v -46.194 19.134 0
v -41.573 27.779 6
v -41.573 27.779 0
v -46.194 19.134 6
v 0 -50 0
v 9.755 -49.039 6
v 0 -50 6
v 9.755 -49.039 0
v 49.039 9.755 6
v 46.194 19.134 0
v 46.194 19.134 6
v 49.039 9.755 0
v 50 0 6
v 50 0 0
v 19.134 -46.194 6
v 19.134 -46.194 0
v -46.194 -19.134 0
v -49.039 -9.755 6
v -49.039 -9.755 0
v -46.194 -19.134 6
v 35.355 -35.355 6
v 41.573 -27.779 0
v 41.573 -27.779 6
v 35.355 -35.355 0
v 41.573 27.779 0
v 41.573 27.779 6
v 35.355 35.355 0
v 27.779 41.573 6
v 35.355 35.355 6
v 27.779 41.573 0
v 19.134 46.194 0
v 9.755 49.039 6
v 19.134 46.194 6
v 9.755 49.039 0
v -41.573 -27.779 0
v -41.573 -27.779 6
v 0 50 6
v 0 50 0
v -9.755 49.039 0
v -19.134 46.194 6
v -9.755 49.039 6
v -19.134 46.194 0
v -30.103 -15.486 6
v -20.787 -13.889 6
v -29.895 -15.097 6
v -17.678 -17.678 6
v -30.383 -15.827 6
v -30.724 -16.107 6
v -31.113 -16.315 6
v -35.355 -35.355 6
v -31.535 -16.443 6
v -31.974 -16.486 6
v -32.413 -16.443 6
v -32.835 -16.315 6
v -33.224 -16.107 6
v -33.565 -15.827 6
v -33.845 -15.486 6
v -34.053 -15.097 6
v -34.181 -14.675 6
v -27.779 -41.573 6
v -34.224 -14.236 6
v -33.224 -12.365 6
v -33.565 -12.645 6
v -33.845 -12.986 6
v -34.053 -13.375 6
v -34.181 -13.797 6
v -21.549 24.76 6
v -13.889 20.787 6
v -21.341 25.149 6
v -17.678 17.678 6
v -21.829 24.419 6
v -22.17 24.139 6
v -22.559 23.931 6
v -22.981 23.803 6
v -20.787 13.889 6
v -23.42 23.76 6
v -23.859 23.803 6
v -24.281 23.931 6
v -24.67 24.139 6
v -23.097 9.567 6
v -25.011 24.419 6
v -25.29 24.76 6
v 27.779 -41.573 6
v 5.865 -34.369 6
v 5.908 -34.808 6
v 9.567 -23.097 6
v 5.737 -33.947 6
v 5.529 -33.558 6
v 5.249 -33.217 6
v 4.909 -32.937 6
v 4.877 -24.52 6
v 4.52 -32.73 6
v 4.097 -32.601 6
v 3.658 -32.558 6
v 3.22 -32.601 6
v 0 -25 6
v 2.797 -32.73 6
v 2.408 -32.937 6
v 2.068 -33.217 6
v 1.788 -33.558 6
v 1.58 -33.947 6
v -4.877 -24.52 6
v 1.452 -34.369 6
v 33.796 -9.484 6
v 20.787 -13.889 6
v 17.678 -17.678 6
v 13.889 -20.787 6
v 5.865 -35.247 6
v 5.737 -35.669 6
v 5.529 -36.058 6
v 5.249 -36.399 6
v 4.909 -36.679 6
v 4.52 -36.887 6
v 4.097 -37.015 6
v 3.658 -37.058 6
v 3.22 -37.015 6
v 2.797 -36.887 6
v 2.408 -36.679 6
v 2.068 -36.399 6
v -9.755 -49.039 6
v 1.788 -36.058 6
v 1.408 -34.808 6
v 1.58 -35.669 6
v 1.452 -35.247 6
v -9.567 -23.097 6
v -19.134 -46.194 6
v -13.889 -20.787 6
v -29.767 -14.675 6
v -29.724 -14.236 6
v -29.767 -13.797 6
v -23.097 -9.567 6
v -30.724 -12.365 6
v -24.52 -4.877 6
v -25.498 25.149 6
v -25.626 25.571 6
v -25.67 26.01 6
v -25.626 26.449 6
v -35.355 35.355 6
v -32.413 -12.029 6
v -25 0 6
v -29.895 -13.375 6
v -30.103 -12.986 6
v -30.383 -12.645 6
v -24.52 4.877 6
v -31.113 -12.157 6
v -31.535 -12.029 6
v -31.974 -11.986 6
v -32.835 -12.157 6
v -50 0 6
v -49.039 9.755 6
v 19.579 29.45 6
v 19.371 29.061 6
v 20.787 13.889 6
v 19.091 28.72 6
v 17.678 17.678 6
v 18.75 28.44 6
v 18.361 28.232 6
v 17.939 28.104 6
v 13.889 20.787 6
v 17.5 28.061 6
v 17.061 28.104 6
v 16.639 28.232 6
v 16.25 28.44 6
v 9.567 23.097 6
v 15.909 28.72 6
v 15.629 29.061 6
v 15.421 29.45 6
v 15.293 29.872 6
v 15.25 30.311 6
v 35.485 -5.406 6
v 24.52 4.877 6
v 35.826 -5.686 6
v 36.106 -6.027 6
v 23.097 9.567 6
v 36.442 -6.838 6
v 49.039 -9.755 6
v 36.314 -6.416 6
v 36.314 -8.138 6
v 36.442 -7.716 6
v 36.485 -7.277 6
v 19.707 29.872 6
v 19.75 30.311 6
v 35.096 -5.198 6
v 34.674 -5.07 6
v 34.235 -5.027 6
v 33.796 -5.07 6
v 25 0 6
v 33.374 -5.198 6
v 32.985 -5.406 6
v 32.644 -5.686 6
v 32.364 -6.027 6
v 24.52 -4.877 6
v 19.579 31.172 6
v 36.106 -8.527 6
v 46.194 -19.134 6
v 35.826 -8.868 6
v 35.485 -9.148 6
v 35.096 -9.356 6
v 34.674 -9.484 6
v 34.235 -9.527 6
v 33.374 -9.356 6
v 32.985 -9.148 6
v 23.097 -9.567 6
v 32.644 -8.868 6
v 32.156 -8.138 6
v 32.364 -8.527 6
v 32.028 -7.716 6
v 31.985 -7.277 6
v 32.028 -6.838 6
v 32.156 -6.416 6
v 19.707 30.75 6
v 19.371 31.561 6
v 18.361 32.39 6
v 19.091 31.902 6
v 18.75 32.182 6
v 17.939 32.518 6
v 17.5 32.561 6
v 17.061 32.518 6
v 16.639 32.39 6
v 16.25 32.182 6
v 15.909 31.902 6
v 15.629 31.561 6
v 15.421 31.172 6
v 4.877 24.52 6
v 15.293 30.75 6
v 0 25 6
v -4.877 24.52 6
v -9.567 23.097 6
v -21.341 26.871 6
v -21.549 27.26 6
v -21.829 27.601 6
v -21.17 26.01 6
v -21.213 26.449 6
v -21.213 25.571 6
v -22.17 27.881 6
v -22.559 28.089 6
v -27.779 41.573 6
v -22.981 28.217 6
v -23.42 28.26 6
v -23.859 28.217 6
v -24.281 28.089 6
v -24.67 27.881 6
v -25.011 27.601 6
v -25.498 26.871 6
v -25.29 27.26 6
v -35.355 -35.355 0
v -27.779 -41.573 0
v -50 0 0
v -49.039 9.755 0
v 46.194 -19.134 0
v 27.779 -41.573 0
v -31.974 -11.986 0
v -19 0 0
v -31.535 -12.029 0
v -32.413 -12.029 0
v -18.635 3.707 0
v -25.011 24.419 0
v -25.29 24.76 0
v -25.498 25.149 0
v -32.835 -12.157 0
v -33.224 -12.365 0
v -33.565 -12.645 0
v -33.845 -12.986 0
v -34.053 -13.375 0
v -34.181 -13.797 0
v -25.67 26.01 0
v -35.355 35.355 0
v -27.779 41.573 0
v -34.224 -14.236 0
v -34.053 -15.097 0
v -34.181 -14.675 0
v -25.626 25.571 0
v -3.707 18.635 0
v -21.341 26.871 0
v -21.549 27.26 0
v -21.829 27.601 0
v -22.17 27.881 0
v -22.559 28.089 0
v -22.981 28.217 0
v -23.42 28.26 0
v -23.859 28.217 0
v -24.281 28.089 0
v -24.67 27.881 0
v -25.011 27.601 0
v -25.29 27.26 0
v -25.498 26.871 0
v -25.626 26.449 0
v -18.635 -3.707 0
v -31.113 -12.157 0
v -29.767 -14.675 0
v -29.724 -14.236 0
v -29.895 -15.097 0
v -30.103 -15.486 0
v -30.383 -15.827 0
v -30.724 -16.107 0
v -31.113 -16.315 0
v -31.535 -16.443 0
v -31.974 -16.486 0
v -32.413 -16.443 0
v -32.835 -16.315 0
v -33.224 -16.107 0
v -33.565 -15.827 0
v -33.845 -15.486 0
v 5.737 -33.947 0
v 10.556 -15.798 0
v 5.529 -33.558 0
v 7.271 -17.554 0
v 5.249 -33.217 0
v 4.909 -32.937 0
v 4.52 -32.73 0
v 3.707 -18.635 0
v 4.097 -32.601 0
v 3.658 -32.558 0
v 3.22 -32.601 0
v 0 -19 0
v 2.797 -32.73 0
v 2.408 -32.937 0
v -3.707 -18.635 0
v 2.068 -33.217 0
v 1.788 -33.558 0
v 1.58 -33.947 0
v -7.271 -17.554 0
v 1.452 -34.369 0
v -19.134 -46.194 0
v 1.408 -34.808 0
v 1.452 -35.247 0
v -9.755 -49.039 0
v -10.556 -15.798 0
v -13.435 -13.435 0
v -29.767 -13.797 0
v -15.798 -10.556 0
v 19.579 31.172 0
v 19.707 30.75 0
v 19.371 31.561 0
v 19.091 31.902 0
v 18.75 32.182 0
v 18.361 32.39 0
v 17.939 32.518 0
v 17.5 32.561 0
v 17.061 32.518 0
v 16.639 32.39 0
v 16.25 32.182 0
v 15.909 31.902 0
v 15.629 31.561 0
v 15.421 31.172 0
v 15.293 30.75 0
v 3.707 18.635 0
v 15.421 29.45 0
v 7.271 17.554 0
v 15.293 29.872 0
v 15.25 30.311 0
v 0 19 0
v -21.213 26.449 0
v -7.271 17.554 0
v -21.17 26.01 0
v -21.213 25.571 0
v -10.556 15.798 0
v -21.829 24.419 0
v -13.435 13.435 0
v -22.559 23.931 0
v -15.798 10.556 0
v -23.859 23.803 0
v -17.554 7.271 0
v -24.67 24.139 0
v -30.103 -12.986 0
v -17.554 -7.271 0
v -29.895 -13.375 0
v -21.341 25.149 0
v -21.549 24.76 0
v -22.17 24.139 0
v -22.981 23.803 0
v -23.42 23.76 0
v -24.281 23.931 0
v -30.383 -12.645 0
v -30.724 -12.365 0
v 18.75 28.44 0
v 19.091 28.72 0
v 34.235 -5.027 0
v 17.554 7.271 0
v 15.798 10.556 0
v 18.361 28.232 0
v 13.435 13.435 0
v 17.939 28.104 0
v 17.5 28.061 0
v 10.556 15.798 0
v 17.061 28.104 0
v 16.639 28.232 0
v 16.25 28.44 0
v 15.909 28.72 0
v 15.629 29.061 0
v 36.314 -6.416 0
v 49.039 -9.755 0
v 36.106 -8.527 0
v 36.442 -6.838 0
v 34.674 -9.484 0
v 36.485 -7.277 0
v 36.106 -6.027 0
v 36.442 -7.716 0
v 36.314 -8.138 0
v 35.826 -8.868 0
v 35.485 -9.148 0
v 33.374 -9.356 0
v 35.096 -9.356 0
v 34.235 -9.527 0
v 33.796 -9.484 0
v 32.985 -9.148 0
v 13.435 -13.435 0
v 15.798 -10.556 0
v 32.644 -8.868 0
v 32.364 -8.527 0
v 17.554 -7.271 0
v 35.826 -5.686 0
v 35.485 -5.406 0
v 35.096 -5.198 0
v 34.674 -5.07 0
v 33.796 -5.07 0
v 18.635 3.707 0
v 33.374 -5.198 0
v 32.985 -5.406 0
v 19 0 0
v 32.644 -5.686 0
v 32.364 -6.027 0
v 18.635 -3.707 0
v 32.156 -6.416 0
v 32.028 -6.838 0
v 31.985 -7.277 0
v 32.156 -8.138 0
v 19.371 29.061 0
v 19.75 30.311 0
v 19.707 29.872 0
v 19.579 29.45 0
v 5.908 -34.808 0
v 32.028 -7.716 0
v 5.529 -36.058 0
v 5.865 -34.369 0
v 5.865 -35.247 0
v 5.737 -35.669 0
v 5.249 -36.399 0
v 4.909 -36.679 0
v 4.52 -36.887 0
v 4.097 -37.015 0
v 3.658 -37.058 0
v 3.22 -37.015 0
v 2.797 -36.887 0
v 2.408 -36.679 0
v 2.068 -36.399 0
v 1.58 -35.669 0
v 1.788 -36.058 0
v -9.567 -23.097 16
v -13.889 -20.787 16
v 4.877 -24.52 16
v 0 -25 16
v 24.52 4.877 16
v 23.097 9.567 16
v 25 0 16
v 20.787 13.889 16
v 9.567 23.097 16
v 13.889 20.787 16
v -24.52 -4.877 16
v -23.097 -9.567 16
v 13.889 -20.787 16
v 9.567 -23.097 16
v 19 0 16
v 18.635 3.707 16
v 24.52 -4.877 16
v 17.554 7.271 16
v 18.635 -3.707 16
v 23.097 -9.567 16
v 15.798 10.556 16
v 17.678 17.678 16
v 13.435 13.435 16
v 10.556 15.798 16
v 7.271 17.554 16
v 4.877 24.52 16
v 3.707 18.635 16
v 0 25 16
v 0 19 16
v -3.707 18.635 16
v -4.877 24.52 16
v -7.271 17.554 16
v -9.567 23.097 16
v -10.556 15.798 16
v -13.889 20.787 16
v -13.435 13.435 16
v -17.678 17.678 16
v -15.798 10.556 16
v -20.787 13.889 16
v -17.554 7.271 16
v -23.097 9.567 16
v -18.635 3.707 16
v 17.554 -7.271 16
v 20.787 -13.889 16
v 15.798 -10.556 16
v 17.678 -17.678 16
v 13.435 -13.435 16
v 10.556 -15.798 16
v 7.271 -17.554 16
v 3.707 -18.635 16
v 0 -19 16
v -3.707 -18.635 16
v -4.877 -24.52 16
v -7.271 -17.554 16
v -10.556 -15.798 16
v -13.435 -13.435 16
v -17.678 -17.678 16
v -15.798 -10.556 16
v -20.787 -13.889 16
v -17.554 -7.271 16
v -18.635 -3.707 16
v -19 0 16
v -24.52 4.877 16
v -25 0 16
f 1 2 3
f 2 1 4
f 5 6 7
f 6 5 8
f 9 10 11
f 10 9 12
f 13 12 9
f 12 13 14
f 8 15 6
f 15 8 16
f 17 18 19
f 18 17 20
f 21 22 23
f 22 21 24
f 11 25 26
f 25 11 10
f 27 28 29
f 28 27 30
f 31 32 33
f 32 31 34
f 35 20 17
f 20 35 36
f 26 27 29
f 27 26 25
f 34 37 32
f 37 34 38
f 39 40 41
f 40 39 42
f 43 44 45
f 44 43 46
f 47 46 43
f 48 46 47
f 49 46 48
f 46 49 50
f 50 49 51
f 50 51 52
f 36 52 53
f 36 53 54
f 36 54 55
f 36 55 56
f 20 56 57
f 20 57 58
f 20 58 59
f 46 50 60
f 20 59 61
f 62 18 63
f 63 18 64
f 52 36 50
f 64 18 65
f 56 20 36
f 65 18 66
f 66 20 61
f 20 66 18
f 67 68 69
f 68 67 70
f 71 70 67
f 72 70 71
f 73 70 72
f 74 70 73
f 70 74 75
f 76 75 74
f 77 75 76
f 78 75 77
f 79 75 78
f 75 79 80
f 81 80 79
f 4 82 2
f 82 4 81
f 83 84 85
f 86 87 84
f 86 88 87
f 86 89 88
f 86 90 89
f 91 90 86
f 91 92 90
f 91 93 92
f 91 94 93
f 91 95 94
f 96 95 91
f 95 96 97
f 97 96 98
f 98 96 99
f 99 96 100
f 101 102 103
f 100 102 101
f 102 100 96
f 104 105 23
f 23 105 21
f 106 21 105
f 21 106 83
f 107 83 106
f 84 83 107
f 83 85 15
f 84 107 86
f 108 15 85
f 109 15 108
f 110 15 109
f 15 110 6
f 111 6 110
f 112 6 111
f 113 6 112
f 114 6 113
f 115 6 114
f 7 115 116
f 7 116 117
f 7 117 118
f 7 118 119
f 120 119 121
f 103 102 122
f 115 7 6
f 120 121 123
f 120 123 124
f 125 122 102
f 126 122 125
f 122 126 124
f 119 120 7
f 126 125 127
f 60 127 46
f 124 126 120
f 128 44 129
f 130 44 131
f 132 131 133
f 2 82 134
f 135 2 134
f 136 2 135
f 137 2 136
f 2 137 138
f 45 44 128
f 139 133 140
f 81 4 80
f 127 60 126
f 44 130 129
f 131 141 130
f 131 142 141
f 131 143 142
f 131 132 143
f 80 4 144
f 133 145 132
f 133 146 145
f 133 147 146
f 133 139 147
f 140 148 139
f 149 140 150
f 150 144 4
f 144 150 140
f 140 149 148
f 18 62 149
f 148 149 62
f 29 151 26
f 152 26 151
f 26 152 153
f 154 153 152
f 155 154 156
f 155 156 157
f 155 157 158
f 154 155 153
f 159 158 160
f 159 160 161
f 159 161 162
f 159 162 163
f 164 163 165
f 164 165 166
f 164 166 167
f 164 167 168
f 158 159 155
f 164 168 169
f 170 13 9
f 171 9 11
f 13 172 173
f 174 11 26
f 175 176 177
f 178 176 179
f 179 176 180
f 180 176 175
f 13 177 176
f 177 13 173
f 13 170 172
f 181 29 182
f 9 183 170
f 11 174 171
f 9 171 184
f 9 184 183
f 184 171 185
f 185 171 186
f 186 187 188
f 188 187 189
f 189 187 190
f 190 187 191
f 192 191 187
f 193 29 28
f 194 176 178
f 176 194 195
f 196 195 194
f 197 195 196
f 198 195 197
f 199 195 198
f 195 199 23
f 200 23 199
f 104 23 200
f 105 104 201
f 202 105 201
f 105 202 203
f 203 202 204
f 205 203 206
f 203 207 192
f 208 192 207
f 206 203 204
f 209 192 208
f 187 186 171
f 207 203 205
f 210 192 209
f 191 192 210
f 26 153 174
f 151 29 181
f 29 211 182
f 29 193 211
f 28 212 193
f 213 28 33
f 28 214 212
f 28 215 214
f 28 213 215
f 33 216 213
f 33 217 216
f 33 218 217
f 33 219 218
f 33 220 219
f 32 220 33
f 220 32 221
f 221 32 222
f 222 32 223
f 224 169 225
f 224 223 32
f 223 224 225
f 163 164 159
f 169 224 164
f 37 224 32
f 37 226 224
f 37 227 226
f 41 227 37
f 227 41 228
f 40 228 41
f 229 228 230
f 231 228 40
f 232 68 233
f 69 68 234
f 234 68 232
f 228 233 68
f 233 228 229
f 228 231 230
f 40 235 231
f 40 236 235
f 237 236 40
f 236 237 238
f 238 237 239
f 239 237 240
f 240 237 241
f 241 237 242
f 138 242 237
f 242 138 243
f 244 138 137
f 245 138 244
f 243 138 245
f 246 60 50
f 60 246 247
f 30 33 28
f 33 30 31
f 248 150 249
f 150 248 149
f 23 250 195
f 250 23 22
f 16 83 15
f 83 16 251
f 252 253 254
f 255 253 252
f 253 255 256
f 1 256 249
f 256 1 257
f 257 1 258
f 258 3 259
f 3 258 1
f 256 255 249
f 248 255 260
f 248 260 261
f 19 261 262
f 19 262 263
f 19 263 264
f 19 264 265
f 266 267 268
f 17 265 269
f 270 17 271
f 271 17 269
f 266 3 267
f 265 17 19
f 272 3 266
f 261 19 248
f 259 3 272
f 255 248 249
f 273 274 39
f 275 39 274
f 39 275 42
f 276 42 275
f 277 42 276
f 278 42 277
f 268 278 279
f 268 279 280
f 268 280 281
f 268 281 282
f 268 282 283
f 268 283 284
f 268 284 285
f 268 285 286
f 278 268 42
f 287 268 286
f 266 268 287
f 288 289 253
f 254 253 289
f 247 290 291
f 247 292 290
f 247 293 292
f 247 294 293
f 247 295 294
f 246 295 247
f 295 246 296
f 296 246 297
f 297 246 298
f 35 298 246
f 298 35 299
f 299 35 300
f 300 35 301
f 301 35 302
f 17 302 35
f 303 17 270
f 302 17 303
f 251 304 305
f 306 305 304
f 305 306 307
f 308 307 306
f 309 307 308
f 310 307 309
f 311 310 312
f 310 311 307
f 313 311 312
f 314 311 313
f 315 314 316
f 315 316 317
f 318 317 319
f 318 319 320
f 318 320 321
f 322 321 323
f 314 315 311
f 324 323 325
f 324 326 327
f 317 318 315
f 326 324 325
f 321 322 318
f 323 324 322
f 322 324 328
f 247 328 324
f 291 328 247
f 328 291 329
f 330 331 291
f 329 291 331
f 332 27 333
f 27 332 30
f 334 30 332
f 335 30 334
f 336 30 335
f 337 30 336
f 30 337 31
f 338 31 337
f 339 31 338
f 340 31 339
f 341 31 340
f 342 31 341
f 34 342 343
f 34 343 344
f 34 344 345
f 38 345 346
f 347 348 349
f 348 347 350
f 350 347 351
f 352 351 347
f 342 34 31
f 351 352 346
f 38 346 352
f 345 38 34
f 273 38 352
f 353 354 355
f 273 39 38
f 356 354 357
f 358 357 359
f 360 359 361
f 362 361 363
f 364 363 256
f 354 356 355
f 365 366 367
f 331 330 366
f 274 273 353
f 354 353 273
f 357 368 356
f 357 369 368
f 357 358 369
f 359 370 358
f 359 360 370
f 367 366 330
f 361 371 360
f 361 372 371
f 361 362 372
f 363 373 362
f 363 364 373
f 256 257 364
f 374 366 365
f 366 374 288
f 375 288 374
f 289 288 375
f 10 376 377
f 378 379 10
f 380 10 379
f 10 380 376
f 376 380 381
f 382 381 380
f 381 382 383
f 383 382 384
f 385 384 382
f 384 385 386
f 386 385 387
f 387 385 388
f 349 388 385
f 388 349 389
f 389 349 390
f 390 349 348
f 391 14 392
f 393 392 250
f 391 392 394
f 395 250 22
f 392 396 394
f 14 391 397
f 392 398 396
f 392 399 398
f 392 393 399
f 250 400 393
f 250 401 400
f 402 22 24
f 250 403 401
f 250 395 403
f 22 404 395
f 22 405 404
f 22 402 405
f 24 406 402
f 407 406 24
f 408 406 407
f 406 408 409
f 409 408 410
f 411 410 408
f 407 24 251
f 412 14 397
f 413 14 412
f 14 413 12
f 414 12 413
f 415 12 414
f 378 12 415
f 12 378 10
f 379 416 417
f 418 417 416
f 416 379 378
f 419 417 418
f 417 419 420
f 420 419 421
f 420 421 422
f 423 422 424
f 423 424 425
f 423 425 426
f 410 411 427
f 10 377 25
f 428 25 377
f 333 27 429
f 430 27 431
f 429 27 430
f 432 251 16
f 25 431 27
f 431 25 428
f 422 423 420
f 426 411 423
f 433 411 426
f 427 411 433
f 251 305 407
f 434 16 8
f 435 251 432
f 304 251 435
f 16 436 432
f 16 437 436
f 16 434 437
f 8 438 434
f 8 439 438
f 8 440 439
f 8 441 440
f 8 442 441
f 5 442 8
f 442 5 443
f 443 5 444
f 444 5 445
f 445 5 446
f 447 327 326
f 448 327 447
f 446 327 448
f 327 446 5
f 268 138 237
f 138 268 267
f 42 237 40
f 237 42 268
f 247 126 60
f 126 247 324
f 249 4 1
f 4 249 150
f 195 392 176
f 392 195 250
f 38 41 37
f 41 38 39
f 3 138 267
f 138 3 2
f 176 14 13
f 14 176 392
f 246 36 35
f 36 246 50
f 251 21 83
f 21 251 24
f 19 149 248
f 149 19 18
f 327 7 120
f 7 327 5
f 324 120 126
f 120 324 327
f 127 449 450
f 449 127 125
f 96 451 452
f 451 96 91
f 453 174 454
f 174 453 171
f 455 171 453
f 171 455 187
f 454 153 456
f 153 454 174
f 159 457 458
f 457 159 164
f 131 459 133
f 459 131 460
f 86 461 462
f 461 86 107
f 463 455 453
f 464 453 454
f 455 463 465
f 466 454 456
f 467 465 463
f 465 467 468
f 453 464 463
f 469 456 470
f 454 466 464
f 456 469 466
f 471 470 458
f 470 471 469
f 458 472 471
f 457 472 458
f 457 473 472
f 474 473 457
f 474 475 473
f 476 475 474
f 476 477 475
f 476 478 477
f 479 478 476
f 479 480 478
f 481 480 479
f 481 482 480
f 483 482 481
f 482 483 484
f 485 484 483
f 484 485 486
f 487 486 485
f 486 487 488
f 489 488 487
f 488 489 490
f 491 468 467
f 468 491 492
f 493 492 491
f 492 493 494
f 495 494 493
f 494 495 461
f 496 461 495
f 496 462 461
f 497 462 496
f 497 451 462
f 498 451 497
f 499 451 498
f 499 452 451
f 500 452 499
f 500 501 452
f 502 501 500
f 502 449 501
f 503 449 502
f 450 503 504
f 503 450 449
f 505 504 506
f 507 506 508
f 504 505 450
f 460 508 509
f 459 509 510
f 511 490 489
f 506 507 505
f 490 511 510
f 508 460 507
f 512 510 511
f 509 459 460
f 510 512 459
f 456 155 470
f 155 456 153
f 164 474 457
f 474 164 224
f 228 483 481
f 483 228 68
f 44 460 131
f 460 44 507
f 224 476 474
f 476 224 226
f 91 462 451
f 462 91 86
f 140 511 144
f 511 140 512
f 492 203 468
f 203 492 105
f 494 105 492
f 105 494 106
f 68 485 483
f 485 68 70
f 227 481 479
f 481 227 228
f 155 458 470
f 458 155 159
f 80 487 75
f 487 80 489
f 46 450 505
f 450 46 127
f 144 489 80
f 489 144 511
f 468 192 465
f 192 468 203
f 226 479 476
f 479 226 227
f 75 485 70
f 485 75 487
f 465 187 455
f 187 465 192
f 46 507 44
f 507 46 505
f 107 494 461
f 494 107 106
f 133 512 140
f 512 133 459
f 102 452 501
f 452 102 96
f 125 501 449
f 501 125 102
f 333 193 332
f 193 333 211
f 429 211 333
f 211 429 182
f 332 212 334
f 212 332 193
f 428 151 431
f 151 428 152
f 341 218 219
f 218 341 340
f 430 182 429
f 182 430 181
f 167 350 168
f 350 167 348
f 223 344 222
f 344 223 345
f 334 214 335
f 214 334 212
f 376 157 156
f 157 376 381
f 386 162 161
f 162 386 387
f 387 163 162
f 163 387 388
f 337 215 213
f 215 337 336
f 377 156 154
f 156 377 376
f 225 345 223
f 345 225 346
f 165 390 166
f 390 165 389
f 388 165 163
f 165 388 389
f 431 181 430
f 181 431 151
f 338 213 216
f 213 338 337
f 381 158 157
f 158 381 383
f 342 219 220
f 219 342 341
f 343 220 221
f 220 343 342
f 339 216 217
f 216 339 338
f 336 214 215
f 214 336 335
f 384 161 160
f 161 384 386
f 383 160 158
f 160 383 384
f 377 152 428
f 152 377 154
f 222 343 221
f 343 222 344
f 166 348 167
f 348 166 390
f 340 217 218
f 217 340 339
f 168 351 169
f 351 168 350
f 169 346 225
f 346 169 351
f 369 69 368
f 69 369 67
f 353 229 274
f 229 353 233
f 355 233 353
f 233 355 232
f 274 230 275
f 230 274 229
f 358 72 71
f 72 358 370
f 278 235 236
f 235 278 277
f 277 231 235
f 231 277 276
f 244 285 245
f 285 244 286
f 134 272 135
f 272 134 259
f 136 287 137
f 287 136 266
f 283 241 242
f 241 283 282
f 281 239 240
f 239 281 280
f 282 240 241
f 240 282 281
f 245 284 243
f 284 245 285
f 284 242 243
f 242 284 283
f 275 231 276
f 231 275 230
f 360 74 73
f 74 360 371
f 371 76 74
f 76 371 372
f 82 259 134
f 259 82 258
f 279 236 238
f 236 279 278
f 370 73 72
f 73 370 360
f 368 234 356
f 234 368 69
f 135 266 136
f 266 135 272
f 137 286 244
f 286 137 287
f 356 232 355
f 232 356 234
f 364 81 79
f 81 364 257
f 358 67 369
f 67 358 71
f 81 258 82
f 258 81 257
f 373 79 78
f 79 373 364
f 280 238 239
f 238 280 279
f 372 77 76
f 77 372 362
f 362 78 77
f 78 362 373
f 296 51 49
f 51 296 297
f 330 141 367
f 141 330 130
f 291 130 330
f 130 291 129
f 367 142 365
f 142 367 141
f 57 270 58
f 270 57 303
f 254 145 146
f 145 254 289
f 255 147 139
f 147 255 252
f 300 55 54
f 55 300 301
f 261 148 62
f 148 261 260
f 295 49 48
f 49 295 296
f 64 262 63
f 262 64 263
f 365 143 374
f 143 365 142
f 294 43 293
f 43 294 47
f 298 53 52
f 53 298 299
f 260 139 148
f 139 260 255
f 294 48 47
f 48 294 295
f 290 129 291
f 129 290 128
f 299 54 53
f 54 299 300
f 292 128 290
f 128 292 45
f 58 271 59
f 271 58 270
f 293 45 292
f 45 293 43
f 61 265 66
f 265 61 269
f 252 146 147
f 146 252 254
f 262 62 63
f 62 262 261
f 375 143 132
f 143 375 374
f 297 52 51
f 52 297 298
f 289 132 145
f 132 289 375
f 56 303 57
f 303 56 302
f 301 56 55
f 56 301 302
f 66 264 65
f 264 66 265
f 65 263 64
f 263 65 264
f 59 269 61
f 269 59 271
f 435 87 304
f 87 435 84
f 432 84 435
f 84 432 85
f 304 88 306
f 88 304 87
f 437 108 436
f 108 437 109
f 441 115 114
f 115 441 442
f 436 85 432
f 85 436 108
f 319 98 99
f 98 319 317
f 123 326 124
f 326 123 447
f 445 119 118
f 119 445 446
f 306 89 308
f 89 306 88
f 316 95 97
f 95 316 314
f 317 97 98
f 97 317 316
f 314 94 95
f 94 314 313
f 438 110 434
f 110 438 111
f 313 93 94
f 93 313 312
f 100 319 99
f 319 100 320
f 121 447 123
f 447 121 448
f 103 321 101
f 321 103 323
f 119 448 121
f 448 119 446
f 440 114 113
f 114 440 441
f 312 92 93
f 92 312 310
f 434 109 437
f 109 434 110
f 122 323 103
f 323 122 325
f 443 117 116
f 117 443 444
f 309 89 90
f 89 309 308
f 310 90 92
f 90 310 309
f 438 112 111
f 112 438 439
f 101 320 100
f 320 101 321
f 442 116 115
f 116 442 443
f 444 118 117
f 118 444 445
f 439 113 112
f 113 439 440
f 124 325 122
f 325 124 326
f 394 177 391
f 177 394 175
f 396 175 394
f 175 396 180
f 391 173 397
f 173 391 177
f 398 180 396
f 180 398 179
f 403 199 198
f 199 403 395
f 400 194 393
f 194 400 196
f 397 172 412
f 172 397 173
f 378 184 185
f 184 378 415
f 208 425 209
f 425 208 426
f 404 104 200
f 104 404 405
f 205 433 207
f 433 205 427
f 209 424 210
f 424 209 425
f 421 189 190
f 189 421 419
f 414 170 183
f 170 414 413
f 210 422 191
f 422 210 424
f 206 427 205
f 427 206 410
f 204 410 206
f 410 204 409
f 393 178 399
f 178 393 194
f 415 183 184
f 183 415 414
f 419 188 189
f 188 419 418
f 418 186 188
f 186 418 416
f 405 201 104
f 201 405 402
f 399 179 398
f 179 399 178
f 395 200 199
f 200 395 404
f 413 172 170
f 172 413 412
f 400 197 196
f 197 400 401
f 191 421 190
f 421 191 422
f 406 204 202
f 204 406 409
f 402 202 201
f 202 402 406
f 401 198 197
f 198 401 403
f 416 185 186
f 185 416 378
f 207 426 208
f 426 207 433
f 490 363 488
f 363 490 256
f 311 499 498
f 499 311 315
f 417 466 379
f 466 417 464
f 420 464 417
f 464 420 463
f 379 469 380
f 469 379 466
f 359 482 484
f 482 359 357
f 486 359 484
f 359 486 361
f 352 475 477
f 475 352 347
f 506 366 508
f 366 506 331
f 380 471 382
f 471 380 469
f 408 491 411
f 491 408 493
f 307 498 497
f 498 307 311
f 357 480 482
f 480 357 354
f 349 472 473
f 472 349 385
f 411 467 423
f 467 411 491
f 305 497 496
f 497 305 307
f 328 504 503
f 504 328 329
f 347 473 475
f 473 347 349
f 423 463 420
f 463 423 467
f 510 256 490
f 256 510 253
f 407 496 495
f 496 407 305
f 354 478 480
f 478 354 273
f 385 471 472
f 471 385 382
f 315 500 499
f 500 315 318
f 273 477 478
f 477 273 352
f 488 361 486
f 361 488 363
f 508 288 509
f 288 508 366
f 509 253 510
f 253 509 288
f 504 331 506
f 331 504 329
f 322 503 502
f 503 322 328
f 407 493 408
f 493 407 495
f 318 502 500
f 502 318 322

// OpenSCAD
$fn = 32;

// ----------------------------------------------------------------------
// Flange Ø100 x 6
// 5 holes on a Ø70 bolt circle, bolted joints
// ----------------------------------------------------------------------

// --- parameters (mm) ---
flange_d = 100;   // outside diameter of the flange
seat_tol = 0.15;  // tolerance at the seating features
free_tol = 0.5;   // general tolerance on the free sizes
thickness = 6;    // flange thickness
holes = 5;        // number of bolt holes
pcd = 70;         // bolt circle diameter
start_deg = 60;   // angle of the first hole, from +X
hole_d = 4.5;     // bolt hole diameter
bore_d = 38;      // central through bore
hub_d = 50;       // hub outside diameter
hub_h = 10;       // hub height above the flange face (0 = no hub)

// --- derived feature positions (mm) ---
height = thickness + hub_h;  // = 16   overall height of the part
pcd_r = pcd / 2;             // = 35   bolt circle radius
hole_step = 360 / holes;     // = 72   angular pitch
feature_centers = [
  [pcd_r * cos(start_deg + 0 * hole_step), pcd_r * sin(start_deg + 0 * hole_step)],
  [pcd_r * cos(start_deg + 1 * hole_step), pcd_r * sin(start_deg + 1 * hole_step)],
  [pcd_r * cos(start_deg + 2 * hole_step), pcd_r * sin(start_deg + 2 * hole_step)],
  [pcd_r * cos(start_deg + 3 * hole_step), pcd_r * sin(start_deg + 3 * hole_step)],
  [pcd_r * cos(start_deg + 4 * hole_step), pcd_r * sin(start_deg + 4 * hole_step)]
];   // bolt hole centres on the pitch circle

// flange disc, every hole and the bore cut straight through
difference() {
  union() {
    cylinder(d = flange_d, h = thickness);
    cylinder(d = hub_d, h = height);  // hub, overlapped into the flange
  }
  translate([0, 0, -1]) cylinder(d = bore_d, h = height + 2);  // bore, through
  for (centre = feature_centers)
    translate([centre[0], centre[1], -1]) cylinder(d = hole_d, h = thickness + 2);
}
